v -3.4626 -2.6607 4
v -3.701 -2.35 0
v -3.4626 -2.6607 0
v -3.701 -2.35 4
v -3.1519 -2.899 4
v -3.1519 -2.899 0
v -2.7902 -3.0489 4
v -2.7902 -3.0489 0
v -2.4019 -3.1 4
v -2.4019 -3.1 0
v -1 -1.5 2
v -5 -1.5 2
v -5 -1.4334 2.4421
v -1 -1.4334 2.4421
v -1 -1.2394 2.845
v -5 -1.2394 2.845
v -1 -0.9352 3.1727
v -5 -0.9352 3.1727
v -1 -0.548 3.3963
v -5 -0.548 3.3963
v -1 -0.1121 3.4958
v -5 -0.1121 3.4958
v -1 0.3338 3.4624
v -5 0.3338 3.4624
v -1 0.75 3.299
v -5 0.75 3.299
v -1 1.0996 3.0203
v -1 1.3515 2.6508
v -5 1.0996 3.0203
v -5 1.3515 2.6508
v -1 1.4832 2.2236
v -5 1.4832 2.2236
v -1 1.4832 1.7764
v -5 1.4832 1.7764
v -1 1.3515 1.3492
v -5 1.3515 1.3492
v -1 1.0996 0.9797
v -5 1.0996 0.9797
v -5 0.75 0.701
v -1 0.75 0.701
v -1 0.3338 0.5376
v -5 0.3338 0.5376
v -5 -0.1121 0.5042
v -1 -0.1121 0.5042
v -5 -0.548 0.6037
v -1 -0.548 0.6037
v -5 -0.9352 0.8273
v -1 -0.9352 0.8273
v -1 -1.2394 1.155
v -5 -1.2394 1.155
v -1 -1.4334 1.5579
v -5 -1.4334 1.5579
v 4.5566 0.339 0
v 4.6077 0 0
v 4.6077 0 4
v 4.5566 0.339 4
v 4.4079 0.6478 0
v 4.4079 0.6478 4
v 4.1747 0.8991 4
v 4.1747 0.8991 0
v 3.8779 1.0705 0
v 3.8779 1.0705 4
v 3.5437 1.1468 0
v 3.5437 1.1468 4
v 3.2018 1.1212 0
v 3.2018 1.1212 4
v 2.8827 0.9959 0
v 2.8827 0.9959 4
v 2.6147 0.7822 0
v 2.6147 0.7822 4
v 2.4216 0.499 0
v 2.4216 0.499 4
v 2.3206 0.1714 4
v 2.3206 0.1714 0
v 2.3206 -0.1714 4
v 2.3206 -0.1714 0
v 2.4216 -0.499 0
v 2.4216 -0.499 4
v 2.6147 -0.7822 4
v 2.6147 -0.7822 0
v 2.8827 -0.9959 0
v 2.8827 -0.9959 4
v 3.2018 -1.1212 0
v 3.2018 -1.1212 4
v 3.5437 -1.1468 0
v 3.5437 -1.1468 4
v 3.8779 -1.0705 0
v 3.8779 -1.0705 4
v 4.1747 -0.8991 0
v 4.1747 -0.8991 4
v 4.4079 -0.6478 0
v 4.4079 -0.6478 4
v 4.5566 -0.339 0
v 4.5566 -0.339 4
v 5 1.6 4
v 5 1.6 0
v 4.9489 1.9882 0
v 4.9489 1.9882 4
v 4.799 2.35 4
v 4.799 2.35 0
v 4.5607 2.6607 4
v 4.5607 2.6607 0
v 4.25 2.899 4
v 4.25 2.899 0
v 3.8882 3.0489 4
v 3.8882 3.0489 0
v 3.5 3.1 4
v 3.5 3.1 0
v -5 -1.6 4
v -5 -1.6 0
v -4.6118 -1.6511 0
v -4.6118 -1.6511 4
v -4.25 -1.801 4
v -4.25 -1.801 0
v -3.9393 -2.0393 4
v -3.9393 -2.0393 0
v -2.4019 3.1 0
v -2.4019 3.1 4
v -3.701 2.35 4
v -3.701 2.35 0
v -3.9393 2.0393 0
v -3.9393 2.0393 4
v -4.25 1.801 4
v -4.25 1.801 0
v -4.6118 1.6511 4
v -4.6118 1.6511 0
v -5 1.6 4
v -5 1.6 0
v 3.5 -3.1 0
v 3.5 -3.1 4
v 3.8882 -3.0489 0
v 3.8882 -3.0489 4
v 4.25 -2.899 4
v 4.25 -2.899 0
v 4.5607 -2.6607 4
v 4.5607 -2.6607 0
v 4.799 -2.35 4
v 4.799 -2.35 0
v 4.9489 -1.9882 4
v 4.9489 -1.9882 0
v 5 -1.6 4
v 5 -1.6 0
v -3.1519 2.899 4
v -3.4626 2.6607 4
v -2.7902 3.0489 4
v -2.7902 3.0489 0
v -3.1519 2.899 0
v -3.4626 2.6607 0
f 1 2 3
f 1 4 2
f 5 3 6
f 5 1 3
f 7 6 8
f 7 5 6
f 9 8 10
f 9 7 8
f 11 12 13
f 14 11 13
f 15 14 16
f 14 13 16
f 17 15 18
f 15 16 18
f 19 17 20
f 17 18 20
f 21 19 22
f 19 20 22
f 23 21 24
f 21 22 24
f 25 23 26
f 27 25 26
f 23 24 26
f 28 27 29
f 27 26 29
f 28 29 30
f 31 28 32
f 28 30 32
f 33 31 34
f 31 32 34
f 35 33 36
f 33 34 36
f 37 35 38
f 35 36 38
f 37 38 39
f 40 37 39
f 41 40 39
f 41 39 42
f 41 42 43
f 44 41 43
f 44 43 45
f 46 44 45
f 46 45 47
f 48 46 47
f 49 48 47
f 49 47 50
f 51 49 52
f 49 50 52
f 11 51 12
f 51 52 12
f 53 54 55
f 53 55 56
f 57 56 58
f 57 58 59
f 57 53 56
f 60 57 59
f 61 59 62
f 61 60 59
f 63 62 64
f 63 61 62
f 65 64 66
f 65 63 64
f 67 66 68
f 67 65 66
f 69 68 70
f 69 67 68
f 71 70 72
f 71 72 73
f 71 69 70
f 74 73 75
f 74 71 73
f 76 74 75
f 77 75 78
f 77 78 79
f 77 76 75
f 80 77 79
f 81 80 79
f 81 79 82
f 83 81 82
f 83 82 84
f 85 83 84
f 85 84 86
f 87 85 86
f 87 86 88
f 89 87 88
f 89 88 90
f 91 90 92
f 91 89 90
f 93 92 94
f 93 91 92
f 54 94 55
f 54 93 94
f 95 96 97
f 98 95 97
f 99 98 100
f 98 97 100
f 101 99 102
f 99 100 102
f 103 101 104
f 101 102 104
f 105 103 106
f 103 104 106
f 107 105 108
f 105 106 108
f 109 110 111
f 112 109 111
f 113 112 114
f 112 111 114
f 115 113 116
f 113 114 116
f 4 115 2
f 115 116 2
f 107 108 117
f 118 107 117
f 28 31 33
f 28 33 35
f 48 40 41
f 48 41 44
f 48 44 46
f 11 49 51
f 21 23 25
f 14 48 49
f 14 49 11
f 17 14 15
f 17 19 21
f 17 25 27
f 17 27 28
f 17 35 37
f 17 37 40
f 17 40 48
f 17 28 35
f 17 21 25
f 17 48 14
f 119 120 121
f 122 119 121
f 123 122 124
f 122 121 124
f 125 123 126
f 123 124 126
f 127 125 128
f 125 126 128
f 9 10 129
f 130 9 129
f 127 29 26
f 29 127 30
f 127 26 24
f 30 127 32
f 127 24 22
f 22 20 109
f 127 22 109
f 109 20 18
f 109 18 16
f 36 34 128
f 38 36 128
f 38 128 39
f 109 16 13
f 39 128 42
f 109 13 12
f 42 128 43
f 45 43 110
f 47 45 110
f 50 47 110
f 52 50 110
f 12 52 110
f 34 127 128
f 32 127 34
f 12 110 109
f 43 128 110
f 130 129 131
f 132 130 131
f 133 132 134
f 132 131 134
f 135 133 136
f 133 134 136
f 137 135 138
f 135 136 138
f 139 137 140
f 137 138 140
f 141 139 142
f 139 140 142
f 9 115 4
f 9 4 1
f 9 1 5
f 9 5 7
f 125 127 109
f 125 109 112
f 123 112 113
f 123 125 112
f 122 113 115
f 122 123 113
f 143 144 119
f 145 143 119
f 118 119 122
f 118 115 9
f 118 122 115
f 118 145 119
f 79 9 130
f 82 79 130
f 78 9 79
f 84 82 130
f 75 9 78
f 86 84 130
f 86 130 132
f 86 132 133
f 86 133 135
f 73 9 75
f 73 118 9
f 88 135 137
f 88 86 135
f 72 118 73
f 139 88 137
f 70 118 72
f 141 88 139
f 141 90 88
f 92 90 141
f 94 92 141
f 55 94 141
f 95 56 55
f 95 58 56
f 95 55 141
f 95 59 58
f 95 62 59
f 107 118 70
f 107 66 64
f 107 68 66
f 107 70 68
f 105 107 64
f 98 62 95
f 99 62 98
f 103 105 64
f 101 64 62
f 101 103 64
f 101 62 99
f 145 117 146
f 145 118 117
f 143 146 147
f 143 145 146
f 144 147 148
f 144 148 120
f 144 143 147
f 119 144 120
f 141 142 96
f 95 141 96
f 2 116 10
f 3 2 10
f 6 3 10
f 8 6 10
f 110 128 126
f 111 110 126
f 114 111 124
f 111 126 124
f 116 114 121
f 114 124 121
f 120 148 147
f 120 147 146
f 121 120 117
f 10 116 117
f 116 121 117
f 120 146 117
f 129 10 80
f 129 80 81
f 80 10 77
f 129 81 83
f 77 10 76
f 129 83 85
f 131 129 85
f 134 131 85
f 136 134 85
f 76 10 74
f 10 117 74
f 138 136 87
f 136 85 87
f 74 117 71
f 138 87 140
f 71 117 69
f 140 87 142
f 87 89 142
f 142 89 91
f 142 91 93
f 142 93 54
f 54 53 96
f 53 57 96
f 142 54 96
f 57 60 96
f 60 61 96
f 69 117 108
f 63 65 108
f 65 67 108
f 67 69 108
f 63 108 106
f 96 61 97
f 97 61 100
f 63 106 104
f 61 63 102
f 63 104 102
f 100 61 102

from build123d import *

# Parameters (mm, degrees)
F0_R     = 1.15
F1_DEPTH = 4
F2_R     = 1.5
F3_R     = 1.5
F4_DEPTH = 4


with BuildPart() as f1:
    # F0 (on Top) → F1 (new body)
    with BuildSketch(Plane.XY):
        with BuildLine():
            Line((3.5, 3.1), (-3.5, 3.1))
            ThreePointArc((-3.5, 3.1), (-3.93934, 2.03934), (-5, 1.6))
            Line((-5, 1.6), (-5, -1.6))
            ThreePointArc((-5, -1.6), (-3.93934, -2.03934), (-3.5, -3.1))
            Line((-3.5, -3.1), (3.5, -3.1))
            ThreePointArc((3.5, -3.1), (4.56066, -2.66066), (5, -1.6))
            Line((5, -1.6), (5, 1.6))
            ThreePointArc((5, 1.6), (4.56066, 2.66066), (3.5, 3.1))
        make_face()
        with Locations((3.457711, 0)):
            Circle(F0_R, mode=Mode.SUBTRACT)
    extrude(amount=F1_DEPTH)

    # F2
    f2_edges = [f1.edges().sort_by_distance(p)[0] for p in [
        (-3.5, -3.1, 2),
        (-3.5, 3.1, 2),
    ]]
    fillet(f2_edges, radius=F2_R)

    # F3 (on face) → F4 (cut)
    with BuildSketch(Plane(origin=(-5, 0, 0), x_dir=(0, -1, 0), z_dir=(-1, 0, 0))):
        with Locations((0, 2)):
            Circle(F3_R)
    extrude(amount=-F4_DEPTH, mode=Mode.SUBTRACT)


solid = f1.part
